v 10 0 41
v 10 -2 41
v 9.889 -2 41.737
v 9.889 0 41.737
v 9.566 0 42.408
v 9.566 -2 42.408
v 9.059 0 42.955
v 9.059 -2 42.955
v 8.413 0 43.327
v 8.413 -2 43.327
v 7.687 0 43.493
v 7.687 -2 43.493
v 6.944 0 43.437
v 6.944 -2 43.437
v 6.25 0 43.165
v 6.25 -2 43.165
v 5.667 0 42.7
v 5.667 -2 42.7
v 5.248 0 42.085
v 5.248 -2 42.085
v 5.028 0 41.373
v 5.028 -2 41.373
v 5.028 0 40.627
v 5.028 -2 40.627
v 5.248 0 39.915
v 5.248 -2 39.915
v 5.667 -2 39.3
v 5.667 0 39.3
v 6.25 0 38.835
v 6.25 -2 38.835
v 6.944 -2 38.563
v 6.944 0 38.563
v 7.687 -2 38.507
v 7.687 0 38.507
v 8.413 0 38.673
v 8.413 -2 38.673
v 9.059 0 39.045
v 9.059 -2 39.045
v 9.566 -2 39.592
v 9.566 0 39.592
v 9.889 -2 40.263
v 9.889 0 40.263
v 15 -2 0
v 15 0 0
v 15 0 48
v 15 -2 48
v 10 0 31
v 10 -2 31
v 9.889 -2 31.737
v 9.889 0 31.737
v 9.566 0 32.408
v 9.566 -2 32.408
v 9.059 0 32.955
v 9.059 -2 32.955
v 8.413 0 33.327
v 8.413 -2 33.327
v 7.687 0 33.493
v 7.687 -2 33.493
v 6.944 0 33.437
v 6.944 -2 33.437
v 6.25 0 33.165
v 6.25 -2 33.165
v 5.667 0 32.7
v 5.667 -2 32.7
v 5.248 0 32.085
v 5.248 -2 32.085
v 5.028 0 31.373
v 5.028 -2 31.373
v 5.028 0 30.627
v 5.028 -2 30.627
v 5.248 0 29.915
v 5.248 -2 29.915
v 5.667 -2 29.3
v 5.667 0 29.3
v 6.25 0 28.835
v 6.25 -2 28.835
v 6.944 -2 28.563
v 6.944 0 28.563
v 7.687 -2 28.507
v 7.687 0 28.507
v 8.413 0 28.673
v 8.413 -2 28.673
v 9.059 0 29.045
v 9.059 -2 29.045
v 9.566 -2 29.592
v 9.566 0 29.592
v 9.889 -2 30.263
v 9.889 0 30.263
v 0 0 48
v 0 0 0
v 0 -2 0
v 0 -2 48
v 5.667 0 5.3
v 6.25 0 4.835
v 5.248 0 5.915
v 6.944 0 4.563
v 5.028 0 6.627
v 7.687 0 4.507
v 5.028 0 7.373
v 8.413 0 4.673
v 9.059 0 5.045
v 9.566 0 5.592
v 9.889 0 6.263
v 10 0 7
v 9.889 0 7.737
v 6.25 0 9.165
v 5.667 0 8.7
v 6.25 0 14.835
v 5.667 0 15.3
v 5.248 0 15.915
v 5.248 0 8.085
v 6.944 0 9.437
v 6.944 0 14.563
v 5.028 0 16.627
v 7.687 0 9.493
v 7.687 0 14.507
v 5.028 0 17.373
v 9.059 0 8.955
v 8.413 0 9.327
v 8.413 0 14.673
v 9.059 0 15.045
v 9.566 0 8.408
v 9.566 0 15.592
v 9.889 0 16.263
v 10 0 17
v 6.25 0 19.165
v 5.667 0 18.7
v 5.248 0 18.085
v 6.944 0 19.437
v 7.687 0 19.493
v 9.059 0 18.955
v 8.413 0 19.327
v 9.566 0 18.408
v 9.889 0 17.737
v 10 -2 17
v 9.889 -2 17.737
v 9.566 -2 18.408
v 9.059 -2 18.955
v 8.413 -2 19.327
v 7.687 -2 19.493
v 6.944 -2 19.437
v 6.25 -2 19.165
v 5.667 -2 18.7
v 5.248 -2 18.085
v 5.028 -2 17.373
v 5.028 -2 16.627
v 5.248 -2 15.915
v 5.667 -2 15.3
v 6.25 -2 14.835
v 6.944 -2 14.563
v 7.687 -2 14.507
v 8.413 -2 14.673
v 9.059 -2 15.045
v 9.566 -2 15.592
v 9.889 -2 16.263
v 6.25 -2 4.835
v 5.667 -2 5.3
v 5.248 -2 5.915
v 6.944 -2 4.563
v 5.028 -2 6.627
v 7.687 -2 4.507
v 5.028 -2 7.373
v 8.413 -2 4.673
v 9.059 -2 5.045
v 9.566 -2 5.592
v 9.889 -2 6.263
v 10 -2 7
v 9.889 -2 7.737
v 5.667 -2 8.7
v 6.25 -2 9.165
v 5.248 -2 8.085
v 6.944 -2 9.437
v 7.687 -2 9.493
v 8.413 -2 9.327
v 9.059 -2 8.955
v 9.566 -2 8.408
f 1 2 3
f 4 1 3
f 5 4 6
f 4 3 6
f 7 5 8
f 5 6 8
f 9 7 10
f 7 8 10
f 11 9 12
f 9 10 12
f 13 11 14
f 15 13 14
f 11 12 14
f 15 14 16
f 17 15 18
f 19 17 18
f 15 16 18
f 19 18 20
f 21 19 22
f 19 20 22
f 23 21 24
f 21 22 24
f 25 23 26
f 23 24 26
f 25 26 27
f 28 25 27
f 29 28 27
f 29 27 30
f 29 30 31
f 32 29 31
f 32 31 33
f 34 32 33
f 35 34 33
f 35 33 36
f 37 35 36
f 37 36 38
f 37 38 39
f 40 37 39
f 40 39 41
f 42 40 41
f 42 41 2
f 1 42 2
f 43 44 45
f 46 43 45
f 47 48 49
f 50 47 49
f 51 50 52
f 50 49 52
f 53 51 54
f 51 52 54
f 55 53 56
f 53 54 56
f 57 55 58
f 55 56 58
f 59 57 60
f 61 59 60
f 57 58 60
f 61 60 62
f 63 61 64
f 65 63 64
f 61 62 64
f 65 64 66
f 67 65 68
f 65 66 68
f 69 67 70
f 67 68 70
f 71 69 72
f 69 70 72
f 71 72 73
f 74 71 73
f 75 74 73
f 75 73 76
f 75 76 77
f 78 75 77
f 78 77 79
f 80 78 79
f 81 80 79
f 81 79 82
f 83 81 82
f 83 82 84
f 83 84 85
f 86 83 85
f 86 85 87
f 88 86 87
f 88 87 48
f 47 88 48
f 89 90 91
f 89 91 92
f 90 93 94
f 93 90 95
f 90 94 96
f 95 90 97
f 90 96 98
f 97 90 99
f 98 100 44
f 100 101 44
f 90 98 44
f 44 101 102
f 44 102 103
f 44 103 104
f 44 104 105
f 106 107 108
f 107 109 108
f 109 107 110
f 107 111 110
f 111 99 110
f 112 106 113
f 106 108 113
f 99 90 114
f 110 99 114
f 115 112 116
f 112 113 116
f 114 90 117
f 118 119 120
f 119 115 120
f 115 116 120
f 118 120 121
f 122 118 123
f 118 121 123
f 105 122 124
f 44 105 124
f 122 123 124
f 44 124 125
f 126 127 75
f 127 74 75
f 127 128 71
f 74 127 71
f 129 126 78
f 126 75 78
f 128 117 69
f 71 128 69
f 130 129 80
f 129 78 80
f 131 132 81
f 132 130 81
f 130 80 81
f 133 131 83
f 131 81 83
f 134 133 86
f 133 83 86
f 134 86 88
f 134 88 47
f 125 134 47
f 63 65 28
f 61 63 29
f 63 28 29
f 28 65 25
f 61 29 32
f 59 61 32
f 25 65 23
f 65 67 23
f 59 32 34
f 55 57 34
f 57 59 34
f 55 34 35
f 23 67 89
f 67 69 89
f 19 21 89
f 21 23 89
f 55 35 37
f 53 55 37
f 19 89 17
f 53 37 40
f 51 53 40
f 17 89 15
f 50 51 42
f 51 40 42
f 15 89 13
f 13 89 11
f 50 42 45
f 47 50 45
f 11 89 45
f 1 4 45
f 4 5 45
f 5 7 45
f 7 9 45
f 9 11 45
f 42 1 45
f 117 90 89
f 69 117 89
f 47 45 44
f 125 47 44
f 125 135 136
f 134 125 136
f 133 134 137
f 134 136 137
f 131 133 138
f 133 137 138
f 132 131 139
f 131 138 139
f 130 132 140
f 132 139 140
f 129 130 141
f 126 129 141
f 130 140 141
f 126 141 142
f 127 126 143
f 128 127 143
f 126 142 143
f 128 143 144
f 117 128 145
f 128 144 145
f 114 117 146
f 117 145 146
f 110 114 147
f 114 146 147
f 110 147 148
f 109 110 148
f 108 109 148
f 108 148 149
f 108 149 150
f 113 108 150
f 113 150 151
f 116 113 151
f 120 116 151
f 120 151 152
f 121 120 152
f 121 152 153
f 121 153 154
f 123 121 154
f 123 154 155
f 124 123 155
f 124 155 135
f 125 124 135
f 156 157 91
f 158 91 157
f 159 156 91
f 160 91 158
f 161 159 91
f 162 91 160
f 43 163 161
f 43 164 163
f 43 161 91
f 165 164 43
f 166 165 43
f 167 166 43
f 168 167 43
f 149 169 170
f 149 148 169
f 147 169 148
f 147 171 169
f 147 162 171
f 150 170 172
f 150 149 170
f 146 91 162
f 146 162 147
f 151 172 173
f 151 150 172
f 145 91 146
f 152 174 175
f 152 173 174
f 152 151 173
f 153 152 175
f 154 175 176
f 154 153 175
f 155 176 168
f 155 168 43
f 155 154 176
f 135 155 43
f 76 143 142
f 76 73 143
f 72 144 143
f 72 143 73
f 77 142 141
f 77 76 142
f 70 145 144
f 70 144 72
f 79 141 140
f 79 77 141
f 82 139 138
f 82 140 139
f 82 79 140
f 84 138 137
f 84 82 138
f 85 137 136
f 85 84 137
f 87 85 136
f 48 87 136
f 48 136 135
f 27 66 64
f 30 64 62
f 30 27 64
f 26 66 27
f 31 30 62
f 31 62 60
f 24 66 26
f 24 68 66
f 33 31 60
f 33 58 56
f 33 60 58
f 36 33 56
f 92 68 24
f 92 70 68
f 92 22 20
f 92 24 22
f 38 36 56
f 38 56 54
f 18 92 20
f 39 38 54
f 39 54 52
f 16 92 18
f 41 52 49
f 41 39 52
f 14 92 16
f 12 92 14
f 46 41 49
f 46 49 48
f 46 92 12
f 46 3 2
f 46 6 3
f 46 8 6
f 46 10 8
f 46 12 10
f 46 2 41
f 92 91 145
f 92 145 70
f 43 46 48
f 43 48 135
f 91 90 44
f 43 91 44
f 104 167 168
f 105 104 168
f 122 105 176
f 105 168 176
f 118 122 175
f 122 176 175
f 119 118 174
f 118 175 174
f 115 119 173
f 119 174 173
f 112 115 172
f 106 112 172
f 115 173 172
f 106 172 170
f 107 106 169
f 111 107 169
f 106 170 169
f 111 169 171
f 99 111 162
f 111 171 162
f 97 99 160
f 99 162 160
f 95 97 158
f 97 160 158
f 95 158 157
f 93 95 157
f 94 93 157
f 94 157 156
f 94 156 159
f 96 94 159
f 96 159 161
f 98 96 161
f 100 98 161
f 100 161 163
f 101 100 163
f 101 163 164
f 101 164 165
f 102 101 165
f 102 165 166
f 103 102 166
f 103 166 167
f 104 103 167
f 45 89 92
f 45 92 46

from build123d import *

# Parameters (mm, degrees)
SKETCH_W            = 15
SKETCH_H            = 48
PAD_DEPTH           = 2
SKETCH001_R         = 2.5
POCKET_DEPTH        = 2.001
LINEARPATTERN_COUNT = 2
LINEARPATTERN_PITCH = 24


with BuildPart() as part:
    # Sketch → Pad (new body)
    with BuildSketch(Plane.XZ):
        with Locations((7.5, 24)):
            Rectangle(SKETCH_W, SKETCH_H)
    extrude(amount=PAD_DEPTH)

    # Sketch001 (on Face6 of Pad) → Pocket (cut, through all)
    with BuildSketch(Plane.XZ.offset(2)):
        with Locations((7.5, 7)):
            Circle(SKETCH001_R)
        with Locations((7.5, 17)):
            Circle(SKETCH001_R)
    pocket = extrude(amount=-POCKET_DEPTH, mode=Mode.SUBTRACT)

    # LinearPattern: Pocket ×2
    with Locations(*[(0, 0, i * LINEARPATTERN_PITCH) for i in range(1, LINEARPATTERN_COUNT)]):
        add(pocket, mode=Mode.SUBTRACT)


solid = part.part
